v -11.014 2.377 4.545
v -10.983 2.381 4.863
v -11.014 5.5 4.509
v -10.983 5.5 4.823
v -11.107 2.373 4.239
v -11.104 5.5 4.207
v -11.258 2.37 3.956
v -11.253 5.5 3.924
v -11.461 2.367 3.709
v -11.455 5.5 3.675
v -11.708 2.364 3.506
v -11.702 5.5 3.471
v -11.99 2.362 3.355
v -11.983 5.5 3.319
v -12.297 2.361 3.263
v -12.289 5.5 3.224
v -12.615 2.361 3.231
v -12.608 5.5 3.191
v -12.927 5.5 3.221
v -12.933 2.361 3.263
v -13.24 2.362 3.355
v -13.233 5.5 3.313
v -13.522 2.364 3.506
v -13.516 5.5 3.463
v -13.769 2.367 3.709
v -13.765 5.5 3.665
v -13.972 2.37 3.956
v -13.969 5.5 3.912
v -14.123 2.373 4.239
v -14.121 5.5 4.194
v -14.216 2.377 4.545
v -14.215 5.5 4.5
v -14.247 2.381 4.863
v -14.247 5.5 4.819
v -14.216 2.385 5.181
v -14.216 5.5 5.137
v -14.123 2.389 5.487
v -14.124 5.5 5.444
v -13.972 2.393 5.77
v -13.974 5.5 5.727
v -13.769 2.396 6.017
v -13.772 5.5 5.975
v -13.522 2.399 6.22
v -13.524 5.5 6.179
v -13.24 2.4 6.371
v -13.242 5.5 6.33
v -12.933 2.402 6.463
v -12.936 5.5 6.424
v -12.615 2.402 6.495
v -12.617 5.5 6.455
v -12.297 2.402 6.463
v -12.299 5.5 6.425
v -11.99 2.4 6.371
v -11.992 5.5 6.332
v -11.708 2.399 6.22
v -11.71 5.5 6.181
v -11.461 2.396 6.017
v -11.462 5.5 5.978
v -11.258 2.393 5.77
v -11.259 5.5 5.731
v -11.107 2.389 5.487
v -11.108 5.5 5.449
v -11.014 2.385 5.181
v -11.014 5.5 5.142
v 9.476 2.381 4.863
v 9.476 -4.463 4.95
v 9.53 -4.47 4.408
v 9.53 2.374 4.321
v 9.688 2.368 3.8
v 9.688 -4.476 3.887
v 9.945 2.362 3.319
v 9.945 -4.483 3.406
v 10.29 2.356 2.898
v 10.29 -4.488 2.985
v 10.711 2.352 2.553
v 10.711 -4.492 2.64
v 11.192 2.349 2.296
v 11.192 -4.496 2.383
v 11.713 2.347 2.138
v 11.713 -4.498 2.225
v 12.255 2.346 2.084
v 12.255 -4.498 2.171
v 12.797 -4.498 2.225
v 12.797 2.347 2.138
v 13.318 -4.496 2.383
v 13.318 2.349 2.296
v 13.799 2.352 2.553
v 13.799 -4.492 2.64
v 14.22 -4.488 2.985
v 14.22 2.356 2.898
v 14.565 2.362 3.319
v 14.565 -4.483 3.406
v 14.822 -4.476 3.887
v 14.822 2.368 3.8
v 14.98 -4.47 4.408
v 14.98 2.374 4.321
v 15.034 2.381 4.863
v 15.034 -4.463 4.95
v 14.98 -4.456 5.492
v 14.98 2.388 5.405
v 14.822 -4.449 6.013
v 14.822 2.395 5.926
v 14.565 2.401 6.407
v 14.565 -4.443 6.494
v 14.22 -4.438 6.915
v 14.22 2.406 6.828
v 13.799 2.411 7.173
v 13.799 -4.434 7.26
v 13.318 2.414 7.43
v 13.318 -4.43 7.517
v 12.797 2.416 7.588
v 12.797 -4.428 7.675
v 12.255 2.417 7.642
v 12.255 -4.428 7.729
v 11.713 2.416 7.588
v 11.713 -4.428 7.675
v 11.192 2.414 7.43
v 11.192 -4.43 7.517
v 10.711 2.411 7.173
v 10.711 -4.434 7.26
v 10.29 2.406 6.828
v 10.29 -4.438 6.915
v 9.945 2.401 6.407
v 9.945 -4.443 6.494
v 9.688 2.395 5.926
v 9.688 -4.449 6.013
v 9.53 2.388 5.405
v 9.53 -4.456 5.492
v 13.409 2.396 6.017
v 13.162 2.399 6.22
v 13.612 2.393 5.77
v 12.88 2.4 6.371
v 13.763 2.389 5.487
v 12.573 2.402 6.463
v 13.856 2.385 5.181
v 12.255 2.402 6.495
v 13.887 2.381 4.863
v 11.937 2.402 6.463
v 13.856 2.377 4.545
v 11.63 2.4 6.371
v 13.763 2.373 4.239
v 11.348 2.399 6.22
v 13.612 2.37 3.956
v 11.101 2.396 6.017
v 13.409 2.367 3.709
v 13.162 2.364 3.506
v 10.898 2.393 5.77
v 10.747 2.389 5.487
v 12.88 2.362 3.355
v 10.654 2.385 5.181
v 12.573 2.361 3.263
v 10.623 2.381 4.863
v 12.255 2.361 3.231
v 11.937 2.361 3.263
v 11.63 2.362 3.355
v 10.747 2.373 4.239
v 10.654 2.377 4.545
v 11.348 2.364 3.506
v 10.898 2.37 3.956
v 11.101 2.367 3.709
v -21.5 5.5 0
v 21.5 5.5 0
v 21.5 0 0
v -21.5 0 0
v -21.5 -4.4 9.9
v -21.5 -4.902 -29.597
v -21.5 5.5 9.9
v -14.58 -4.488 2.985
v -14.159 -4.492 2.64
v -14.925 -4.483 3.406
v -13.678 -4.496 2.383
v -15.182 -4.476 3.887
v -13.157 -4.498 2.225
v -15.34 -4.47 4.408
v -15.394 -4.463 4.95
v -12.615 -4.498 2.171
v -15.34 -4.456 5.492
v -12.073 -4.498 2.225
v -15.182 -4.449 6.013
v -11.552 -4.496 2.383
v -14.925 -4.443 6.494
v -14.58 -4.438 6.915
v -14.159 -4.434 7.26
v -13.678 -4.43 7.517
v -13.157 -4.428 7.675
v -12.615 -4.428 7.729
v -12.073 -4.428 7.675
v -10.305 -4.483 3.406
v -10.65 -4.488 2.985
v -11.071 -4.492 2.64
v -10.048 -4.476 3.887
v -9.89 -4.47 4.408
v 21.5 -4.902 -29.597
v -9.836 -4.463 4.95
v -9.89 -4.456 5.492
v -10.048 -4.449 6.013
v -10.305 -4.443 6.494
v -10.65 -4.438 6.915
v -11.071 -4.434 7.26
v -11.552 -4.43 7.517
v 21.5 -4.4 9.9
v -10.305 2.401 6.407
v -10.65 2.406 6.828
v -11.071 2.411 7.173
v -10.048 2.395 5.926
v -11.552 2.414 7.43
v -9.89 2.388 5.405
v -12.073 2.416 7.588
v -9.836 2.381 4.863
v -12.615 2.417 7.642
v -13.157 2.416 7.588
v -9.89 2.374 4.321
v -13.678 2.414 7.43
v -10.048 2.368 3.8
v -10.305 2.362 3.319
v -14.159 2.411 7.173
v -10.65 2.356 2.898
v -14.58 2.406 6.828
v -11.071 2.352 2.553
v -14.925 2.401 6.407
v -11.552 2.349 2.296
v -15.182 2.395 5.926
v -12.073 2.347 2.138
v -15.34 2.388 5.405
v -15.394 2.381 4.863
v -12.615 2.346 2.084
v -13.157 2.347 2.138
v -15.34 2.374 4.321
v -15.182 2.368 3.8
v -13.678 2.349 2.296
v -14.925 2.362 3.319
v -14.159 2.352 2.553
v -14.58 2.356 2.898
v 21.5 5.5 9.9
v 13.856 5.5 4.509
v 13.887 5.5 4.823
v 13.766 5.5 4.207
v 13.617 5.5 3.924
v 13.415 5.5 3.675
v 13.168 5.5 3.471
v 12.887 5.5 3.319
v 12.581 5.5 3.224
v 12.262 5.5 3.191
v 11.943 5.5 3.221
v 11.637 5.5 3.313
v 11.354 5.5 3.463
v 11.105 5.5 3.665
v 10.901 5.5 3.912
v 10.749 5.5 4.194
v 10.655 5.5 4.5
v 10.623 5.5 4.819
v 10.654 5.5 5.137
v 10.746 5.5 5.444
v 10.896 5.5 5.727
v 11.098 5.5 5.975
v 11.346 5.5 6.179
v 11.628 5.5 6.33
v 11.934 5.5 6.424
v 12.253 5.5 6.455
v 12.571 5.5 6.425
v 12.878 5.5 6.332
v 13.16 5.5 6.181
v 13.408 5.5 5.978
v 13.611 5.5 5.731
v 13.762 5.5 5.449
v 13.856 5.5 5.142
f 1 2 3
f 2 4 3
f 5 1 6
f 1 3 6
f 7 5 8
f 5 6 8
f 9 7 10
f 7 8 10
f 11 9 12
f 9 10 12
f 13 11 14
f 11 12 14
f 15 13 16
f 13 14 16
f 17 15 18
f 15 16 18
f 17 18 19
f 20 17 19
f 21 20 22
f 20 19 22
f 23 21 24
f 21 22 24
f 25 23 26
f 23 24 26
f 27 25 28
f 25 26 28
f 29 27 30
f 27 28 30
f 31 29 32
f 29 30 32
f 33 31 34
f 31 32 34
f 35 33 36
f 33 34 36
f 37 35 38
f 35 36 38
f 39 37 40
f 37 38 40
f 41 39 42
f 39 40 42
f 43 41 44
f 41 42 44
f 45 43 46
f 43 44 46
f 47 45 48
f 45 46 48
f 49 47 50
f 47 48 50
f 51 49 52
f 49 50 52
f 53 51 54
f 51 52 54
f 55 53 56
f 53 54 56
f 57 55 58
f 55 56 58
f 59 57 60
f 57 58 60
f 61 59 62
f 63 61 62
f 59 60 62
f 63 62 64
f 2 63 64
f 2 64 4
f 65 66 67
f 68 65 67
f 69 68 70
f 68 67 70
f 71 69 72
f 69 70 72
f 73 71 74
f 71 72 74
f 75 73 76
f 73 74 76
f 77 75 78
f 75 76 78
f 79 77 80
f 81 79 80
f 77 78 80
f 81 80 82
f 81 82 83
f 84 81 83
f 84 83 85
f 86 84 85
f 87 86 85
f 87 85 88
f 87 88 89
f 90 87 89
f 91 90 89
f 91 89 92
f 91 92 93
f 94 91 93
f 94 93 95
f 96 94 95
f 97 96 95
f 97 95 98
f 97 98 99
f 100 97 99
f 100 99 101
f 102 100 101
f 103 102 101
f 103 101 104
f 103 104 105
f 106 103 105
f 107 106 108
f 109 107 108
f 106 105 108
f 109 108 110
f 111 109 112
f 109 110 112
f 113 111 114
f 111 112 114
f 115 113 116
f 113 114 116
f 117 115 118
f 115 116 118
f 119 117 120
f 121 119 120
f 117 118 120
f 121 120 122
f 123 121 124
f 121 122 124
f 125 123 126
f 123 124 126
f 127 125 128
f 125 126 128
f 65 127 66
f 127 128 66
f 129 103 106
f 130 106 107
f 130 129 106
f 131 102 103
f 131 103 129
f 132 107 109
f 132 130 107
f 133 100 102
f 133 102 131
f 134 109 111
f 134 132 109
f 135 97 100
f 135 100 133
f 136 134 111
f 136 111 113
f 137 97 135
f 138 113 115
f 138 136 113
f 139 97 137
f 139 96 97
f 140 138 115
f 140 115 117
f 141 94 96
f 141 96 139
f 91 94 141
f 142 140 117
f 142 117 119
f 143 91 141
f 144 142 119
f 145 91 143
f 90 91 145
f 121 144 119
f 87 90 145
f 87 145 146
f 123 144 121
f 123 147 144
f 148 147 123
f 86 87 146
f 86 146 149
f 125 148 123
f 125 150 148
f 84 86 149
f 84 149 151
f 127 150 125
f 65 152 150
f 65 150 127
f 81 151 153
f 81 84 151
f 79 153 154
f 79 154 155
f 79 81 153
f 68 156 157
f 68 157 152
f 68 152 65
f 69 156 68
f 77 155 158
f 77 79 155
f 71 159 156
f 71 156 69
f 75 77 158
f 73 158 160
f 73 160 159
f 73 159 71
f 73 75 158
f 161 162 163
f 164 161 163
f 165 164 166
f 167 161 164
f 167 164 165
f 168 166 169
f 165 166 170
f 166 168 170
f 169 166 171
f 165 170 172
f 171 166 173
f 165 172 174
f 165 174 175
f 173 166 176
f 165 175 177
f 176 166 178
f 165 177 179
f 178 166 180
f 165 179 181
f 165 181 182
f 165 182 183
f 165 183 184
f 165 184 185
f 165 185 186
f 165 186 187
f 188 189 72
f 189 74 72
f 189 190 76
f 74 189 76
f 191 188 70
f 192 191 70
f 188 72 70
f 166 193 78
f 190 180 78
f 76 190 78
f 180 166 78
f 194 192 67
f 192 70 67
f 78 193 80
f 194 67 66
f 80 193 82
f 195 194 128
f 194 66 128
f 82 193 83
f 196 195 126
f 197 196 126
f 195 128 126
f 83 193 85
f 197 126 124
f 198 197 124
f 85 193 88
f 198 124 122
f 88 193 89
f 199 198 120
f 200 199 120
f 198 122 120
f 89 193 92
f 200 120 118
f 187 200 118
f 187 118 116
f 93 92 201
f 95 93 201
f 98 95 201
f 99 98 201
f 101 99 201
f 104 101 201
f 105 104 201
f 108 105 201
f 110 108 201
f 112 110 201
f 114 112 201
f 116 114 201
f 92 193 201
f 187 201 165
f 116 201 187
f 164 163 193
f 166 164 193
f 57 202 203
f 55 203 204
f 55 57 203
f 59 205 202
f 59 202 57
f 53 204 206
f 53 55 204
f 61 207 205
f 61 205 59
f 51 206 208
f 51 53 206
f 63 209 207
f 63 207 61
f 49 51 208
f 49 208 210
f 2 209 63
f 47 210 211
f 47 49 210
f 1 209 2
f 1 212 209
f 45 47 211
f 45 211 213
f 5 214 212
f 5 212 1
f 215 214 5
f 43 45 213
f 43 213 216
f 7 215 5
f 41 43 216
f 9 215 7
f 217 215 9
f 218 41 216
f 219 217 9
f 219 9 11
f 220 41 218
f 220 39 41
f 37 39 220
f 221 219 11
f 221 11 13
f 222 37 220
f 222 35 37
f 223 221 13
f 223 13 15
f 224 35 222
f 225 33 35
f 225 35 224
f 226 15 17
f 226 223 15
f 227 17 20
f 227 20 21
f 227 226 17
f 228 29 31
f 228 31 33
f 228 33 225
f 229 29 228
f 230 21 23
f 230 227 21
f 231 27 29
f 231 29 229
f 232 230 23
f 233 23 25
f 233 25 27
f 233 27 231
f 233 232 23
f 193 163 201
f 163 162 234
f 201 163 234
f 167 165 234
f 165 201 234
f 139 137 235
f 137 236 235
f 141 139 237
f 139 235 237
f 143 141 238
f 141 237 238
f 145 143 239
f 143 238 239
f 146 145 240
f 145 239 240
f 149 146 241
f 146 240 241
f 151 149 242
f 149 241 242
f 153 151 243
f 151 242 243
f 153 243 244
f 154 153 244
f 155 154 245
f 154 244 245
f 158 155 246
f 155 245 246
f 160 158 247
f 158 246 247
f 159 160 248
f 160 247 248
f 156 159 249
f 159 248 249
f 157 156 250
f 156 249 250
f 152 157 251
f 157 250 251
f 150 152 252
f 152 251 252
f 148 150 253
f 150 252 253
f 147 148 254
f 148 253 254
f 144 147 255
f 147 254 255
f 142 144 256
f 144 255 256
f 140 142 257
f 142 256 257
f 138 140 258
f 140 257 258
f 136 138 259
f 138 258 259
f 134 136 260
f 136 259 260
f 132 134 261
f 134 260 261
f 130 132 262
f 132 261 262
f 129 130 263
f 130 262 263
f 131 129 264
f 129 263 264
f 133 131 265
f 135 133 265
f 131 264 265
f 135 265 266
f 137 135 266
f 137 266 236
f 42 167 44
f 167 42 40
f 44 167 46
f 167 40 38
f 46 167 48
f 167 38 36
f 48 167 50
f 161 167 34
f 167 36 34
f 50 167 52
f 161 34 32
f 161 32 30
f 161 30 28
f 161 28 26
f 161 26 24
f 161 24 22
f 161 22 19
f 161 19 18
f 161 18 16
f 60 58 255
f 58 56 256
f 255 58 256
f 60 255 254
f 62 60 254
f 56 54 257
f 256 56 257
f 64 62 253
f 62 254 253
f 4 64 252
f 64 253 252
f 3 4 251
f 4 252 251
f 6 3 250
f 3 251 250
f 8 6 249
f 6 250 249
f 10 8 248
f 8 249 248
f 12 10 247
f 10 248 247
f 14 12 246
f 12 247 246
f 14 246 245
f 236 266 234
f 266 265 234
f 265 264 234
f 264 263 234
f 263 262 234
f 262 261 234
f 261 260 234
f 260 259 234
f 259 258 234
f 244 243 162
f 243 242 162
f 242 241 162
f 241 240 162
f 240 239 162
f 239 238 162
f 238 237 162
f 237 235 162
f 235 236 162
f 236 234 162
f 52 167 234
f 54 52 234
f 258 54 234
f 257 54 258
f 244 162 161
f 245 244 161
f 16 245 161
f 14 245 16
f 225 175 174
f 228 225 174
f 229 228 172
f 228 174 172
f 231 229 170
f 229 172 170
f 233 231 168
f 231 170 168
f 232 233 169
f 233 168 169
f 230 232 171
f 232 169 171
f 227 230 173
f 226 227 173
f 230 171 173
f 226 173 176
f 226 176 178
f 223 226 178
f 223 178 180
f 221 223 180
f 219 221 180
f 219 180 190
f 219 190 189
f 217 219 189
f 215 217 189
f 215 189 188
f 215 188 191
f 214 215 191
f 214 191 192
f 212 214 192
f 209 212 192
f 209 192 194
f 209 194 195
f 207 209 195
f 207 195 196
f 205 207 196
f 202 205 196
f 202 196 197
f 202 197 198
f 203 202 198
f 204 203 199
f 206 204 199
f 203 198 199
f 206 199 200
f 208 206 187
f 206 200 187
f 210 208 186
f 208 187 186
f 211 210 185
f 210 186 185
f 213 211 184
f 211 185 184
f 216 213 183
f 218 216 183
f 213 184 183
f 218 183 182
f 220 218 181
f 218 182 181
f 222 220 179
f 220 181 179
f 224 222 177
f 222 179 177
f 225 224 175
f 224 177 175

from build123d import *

# Parameters (mm, degrees)
BOSS_EXTRUDE1_DEPTH                            = 21.5
SKETCH4_R                                      = 0.685
CUT_EXTRUDE1_DEPTH                             = 11.401915701
CBORE_FOR_4_SOCKET_HEAD_CAP_SCREW1_D           = 3.2639
CBORE_FOR_4_SOCKET_HEAD_CAP_SCREW1_CBORE_D     = 5.55752
CBORE_FOR_4_SOCKET_HEAD_CAP_SCREW1_CBORE_DEPTH = 6.844792


with BuildPart() as part:
    # Sketch2 → Boss-Extrude1 (new body, symmetric)
    with BuildSketch(Plane(origin=(0, 0, 0), x_dir=(0, 0, -1), z_dir=(1, 0, 0))):
        Polygon((0, 0), (29.596811018, -4.901915701), (-9.9, -4.4), (-9.9, 5.5), (0, 5.5), align=None)
    extrude(amount=BOSS_EXTRUDE1_DEPTH, both=True)

    # Sketch4 → Cut-Extrude1 (cut, through all)
    with BuildSketch(Plane(origin=(0, 5.5, 0), x_dir=(1, 0, 0), z_dir=(0, 1, 0))):
        with Locations((-12.615, -4.95)):
            Circle(SKETCH4_R)
        with Locations((12.255, -4.95)):
            Circle(SKETCH4_R)
    extrude(amount=-CUT_EXTRUDE1_DEPTH, mode=Mode.SUBTRACT)

    # CBORE for #4 Socket Head Cap Screw1 (through all)
    with Locations(Plane(origin=(0, -4.525076009, 0.057503546), x_dir=(-1, 0, 0), z_dir=(0, -0.999919266, 0.012706727))):
        with Locations((12.615, -4.892891475), (-12.255, -4.892891475)):
            CounterBoreHole(CBORE_FOR_4_SOCKET_HEAD_CAP_SCREW1_D / 2, CBORE_FOR_4_SOCKET_HEAD_CAP_SCREW1_CBORE_D / 2, CBORE_FOR_4_SOCKET_HEAD_CAP_SCREW1_CBORE_DEPTH)


solid = part.part
